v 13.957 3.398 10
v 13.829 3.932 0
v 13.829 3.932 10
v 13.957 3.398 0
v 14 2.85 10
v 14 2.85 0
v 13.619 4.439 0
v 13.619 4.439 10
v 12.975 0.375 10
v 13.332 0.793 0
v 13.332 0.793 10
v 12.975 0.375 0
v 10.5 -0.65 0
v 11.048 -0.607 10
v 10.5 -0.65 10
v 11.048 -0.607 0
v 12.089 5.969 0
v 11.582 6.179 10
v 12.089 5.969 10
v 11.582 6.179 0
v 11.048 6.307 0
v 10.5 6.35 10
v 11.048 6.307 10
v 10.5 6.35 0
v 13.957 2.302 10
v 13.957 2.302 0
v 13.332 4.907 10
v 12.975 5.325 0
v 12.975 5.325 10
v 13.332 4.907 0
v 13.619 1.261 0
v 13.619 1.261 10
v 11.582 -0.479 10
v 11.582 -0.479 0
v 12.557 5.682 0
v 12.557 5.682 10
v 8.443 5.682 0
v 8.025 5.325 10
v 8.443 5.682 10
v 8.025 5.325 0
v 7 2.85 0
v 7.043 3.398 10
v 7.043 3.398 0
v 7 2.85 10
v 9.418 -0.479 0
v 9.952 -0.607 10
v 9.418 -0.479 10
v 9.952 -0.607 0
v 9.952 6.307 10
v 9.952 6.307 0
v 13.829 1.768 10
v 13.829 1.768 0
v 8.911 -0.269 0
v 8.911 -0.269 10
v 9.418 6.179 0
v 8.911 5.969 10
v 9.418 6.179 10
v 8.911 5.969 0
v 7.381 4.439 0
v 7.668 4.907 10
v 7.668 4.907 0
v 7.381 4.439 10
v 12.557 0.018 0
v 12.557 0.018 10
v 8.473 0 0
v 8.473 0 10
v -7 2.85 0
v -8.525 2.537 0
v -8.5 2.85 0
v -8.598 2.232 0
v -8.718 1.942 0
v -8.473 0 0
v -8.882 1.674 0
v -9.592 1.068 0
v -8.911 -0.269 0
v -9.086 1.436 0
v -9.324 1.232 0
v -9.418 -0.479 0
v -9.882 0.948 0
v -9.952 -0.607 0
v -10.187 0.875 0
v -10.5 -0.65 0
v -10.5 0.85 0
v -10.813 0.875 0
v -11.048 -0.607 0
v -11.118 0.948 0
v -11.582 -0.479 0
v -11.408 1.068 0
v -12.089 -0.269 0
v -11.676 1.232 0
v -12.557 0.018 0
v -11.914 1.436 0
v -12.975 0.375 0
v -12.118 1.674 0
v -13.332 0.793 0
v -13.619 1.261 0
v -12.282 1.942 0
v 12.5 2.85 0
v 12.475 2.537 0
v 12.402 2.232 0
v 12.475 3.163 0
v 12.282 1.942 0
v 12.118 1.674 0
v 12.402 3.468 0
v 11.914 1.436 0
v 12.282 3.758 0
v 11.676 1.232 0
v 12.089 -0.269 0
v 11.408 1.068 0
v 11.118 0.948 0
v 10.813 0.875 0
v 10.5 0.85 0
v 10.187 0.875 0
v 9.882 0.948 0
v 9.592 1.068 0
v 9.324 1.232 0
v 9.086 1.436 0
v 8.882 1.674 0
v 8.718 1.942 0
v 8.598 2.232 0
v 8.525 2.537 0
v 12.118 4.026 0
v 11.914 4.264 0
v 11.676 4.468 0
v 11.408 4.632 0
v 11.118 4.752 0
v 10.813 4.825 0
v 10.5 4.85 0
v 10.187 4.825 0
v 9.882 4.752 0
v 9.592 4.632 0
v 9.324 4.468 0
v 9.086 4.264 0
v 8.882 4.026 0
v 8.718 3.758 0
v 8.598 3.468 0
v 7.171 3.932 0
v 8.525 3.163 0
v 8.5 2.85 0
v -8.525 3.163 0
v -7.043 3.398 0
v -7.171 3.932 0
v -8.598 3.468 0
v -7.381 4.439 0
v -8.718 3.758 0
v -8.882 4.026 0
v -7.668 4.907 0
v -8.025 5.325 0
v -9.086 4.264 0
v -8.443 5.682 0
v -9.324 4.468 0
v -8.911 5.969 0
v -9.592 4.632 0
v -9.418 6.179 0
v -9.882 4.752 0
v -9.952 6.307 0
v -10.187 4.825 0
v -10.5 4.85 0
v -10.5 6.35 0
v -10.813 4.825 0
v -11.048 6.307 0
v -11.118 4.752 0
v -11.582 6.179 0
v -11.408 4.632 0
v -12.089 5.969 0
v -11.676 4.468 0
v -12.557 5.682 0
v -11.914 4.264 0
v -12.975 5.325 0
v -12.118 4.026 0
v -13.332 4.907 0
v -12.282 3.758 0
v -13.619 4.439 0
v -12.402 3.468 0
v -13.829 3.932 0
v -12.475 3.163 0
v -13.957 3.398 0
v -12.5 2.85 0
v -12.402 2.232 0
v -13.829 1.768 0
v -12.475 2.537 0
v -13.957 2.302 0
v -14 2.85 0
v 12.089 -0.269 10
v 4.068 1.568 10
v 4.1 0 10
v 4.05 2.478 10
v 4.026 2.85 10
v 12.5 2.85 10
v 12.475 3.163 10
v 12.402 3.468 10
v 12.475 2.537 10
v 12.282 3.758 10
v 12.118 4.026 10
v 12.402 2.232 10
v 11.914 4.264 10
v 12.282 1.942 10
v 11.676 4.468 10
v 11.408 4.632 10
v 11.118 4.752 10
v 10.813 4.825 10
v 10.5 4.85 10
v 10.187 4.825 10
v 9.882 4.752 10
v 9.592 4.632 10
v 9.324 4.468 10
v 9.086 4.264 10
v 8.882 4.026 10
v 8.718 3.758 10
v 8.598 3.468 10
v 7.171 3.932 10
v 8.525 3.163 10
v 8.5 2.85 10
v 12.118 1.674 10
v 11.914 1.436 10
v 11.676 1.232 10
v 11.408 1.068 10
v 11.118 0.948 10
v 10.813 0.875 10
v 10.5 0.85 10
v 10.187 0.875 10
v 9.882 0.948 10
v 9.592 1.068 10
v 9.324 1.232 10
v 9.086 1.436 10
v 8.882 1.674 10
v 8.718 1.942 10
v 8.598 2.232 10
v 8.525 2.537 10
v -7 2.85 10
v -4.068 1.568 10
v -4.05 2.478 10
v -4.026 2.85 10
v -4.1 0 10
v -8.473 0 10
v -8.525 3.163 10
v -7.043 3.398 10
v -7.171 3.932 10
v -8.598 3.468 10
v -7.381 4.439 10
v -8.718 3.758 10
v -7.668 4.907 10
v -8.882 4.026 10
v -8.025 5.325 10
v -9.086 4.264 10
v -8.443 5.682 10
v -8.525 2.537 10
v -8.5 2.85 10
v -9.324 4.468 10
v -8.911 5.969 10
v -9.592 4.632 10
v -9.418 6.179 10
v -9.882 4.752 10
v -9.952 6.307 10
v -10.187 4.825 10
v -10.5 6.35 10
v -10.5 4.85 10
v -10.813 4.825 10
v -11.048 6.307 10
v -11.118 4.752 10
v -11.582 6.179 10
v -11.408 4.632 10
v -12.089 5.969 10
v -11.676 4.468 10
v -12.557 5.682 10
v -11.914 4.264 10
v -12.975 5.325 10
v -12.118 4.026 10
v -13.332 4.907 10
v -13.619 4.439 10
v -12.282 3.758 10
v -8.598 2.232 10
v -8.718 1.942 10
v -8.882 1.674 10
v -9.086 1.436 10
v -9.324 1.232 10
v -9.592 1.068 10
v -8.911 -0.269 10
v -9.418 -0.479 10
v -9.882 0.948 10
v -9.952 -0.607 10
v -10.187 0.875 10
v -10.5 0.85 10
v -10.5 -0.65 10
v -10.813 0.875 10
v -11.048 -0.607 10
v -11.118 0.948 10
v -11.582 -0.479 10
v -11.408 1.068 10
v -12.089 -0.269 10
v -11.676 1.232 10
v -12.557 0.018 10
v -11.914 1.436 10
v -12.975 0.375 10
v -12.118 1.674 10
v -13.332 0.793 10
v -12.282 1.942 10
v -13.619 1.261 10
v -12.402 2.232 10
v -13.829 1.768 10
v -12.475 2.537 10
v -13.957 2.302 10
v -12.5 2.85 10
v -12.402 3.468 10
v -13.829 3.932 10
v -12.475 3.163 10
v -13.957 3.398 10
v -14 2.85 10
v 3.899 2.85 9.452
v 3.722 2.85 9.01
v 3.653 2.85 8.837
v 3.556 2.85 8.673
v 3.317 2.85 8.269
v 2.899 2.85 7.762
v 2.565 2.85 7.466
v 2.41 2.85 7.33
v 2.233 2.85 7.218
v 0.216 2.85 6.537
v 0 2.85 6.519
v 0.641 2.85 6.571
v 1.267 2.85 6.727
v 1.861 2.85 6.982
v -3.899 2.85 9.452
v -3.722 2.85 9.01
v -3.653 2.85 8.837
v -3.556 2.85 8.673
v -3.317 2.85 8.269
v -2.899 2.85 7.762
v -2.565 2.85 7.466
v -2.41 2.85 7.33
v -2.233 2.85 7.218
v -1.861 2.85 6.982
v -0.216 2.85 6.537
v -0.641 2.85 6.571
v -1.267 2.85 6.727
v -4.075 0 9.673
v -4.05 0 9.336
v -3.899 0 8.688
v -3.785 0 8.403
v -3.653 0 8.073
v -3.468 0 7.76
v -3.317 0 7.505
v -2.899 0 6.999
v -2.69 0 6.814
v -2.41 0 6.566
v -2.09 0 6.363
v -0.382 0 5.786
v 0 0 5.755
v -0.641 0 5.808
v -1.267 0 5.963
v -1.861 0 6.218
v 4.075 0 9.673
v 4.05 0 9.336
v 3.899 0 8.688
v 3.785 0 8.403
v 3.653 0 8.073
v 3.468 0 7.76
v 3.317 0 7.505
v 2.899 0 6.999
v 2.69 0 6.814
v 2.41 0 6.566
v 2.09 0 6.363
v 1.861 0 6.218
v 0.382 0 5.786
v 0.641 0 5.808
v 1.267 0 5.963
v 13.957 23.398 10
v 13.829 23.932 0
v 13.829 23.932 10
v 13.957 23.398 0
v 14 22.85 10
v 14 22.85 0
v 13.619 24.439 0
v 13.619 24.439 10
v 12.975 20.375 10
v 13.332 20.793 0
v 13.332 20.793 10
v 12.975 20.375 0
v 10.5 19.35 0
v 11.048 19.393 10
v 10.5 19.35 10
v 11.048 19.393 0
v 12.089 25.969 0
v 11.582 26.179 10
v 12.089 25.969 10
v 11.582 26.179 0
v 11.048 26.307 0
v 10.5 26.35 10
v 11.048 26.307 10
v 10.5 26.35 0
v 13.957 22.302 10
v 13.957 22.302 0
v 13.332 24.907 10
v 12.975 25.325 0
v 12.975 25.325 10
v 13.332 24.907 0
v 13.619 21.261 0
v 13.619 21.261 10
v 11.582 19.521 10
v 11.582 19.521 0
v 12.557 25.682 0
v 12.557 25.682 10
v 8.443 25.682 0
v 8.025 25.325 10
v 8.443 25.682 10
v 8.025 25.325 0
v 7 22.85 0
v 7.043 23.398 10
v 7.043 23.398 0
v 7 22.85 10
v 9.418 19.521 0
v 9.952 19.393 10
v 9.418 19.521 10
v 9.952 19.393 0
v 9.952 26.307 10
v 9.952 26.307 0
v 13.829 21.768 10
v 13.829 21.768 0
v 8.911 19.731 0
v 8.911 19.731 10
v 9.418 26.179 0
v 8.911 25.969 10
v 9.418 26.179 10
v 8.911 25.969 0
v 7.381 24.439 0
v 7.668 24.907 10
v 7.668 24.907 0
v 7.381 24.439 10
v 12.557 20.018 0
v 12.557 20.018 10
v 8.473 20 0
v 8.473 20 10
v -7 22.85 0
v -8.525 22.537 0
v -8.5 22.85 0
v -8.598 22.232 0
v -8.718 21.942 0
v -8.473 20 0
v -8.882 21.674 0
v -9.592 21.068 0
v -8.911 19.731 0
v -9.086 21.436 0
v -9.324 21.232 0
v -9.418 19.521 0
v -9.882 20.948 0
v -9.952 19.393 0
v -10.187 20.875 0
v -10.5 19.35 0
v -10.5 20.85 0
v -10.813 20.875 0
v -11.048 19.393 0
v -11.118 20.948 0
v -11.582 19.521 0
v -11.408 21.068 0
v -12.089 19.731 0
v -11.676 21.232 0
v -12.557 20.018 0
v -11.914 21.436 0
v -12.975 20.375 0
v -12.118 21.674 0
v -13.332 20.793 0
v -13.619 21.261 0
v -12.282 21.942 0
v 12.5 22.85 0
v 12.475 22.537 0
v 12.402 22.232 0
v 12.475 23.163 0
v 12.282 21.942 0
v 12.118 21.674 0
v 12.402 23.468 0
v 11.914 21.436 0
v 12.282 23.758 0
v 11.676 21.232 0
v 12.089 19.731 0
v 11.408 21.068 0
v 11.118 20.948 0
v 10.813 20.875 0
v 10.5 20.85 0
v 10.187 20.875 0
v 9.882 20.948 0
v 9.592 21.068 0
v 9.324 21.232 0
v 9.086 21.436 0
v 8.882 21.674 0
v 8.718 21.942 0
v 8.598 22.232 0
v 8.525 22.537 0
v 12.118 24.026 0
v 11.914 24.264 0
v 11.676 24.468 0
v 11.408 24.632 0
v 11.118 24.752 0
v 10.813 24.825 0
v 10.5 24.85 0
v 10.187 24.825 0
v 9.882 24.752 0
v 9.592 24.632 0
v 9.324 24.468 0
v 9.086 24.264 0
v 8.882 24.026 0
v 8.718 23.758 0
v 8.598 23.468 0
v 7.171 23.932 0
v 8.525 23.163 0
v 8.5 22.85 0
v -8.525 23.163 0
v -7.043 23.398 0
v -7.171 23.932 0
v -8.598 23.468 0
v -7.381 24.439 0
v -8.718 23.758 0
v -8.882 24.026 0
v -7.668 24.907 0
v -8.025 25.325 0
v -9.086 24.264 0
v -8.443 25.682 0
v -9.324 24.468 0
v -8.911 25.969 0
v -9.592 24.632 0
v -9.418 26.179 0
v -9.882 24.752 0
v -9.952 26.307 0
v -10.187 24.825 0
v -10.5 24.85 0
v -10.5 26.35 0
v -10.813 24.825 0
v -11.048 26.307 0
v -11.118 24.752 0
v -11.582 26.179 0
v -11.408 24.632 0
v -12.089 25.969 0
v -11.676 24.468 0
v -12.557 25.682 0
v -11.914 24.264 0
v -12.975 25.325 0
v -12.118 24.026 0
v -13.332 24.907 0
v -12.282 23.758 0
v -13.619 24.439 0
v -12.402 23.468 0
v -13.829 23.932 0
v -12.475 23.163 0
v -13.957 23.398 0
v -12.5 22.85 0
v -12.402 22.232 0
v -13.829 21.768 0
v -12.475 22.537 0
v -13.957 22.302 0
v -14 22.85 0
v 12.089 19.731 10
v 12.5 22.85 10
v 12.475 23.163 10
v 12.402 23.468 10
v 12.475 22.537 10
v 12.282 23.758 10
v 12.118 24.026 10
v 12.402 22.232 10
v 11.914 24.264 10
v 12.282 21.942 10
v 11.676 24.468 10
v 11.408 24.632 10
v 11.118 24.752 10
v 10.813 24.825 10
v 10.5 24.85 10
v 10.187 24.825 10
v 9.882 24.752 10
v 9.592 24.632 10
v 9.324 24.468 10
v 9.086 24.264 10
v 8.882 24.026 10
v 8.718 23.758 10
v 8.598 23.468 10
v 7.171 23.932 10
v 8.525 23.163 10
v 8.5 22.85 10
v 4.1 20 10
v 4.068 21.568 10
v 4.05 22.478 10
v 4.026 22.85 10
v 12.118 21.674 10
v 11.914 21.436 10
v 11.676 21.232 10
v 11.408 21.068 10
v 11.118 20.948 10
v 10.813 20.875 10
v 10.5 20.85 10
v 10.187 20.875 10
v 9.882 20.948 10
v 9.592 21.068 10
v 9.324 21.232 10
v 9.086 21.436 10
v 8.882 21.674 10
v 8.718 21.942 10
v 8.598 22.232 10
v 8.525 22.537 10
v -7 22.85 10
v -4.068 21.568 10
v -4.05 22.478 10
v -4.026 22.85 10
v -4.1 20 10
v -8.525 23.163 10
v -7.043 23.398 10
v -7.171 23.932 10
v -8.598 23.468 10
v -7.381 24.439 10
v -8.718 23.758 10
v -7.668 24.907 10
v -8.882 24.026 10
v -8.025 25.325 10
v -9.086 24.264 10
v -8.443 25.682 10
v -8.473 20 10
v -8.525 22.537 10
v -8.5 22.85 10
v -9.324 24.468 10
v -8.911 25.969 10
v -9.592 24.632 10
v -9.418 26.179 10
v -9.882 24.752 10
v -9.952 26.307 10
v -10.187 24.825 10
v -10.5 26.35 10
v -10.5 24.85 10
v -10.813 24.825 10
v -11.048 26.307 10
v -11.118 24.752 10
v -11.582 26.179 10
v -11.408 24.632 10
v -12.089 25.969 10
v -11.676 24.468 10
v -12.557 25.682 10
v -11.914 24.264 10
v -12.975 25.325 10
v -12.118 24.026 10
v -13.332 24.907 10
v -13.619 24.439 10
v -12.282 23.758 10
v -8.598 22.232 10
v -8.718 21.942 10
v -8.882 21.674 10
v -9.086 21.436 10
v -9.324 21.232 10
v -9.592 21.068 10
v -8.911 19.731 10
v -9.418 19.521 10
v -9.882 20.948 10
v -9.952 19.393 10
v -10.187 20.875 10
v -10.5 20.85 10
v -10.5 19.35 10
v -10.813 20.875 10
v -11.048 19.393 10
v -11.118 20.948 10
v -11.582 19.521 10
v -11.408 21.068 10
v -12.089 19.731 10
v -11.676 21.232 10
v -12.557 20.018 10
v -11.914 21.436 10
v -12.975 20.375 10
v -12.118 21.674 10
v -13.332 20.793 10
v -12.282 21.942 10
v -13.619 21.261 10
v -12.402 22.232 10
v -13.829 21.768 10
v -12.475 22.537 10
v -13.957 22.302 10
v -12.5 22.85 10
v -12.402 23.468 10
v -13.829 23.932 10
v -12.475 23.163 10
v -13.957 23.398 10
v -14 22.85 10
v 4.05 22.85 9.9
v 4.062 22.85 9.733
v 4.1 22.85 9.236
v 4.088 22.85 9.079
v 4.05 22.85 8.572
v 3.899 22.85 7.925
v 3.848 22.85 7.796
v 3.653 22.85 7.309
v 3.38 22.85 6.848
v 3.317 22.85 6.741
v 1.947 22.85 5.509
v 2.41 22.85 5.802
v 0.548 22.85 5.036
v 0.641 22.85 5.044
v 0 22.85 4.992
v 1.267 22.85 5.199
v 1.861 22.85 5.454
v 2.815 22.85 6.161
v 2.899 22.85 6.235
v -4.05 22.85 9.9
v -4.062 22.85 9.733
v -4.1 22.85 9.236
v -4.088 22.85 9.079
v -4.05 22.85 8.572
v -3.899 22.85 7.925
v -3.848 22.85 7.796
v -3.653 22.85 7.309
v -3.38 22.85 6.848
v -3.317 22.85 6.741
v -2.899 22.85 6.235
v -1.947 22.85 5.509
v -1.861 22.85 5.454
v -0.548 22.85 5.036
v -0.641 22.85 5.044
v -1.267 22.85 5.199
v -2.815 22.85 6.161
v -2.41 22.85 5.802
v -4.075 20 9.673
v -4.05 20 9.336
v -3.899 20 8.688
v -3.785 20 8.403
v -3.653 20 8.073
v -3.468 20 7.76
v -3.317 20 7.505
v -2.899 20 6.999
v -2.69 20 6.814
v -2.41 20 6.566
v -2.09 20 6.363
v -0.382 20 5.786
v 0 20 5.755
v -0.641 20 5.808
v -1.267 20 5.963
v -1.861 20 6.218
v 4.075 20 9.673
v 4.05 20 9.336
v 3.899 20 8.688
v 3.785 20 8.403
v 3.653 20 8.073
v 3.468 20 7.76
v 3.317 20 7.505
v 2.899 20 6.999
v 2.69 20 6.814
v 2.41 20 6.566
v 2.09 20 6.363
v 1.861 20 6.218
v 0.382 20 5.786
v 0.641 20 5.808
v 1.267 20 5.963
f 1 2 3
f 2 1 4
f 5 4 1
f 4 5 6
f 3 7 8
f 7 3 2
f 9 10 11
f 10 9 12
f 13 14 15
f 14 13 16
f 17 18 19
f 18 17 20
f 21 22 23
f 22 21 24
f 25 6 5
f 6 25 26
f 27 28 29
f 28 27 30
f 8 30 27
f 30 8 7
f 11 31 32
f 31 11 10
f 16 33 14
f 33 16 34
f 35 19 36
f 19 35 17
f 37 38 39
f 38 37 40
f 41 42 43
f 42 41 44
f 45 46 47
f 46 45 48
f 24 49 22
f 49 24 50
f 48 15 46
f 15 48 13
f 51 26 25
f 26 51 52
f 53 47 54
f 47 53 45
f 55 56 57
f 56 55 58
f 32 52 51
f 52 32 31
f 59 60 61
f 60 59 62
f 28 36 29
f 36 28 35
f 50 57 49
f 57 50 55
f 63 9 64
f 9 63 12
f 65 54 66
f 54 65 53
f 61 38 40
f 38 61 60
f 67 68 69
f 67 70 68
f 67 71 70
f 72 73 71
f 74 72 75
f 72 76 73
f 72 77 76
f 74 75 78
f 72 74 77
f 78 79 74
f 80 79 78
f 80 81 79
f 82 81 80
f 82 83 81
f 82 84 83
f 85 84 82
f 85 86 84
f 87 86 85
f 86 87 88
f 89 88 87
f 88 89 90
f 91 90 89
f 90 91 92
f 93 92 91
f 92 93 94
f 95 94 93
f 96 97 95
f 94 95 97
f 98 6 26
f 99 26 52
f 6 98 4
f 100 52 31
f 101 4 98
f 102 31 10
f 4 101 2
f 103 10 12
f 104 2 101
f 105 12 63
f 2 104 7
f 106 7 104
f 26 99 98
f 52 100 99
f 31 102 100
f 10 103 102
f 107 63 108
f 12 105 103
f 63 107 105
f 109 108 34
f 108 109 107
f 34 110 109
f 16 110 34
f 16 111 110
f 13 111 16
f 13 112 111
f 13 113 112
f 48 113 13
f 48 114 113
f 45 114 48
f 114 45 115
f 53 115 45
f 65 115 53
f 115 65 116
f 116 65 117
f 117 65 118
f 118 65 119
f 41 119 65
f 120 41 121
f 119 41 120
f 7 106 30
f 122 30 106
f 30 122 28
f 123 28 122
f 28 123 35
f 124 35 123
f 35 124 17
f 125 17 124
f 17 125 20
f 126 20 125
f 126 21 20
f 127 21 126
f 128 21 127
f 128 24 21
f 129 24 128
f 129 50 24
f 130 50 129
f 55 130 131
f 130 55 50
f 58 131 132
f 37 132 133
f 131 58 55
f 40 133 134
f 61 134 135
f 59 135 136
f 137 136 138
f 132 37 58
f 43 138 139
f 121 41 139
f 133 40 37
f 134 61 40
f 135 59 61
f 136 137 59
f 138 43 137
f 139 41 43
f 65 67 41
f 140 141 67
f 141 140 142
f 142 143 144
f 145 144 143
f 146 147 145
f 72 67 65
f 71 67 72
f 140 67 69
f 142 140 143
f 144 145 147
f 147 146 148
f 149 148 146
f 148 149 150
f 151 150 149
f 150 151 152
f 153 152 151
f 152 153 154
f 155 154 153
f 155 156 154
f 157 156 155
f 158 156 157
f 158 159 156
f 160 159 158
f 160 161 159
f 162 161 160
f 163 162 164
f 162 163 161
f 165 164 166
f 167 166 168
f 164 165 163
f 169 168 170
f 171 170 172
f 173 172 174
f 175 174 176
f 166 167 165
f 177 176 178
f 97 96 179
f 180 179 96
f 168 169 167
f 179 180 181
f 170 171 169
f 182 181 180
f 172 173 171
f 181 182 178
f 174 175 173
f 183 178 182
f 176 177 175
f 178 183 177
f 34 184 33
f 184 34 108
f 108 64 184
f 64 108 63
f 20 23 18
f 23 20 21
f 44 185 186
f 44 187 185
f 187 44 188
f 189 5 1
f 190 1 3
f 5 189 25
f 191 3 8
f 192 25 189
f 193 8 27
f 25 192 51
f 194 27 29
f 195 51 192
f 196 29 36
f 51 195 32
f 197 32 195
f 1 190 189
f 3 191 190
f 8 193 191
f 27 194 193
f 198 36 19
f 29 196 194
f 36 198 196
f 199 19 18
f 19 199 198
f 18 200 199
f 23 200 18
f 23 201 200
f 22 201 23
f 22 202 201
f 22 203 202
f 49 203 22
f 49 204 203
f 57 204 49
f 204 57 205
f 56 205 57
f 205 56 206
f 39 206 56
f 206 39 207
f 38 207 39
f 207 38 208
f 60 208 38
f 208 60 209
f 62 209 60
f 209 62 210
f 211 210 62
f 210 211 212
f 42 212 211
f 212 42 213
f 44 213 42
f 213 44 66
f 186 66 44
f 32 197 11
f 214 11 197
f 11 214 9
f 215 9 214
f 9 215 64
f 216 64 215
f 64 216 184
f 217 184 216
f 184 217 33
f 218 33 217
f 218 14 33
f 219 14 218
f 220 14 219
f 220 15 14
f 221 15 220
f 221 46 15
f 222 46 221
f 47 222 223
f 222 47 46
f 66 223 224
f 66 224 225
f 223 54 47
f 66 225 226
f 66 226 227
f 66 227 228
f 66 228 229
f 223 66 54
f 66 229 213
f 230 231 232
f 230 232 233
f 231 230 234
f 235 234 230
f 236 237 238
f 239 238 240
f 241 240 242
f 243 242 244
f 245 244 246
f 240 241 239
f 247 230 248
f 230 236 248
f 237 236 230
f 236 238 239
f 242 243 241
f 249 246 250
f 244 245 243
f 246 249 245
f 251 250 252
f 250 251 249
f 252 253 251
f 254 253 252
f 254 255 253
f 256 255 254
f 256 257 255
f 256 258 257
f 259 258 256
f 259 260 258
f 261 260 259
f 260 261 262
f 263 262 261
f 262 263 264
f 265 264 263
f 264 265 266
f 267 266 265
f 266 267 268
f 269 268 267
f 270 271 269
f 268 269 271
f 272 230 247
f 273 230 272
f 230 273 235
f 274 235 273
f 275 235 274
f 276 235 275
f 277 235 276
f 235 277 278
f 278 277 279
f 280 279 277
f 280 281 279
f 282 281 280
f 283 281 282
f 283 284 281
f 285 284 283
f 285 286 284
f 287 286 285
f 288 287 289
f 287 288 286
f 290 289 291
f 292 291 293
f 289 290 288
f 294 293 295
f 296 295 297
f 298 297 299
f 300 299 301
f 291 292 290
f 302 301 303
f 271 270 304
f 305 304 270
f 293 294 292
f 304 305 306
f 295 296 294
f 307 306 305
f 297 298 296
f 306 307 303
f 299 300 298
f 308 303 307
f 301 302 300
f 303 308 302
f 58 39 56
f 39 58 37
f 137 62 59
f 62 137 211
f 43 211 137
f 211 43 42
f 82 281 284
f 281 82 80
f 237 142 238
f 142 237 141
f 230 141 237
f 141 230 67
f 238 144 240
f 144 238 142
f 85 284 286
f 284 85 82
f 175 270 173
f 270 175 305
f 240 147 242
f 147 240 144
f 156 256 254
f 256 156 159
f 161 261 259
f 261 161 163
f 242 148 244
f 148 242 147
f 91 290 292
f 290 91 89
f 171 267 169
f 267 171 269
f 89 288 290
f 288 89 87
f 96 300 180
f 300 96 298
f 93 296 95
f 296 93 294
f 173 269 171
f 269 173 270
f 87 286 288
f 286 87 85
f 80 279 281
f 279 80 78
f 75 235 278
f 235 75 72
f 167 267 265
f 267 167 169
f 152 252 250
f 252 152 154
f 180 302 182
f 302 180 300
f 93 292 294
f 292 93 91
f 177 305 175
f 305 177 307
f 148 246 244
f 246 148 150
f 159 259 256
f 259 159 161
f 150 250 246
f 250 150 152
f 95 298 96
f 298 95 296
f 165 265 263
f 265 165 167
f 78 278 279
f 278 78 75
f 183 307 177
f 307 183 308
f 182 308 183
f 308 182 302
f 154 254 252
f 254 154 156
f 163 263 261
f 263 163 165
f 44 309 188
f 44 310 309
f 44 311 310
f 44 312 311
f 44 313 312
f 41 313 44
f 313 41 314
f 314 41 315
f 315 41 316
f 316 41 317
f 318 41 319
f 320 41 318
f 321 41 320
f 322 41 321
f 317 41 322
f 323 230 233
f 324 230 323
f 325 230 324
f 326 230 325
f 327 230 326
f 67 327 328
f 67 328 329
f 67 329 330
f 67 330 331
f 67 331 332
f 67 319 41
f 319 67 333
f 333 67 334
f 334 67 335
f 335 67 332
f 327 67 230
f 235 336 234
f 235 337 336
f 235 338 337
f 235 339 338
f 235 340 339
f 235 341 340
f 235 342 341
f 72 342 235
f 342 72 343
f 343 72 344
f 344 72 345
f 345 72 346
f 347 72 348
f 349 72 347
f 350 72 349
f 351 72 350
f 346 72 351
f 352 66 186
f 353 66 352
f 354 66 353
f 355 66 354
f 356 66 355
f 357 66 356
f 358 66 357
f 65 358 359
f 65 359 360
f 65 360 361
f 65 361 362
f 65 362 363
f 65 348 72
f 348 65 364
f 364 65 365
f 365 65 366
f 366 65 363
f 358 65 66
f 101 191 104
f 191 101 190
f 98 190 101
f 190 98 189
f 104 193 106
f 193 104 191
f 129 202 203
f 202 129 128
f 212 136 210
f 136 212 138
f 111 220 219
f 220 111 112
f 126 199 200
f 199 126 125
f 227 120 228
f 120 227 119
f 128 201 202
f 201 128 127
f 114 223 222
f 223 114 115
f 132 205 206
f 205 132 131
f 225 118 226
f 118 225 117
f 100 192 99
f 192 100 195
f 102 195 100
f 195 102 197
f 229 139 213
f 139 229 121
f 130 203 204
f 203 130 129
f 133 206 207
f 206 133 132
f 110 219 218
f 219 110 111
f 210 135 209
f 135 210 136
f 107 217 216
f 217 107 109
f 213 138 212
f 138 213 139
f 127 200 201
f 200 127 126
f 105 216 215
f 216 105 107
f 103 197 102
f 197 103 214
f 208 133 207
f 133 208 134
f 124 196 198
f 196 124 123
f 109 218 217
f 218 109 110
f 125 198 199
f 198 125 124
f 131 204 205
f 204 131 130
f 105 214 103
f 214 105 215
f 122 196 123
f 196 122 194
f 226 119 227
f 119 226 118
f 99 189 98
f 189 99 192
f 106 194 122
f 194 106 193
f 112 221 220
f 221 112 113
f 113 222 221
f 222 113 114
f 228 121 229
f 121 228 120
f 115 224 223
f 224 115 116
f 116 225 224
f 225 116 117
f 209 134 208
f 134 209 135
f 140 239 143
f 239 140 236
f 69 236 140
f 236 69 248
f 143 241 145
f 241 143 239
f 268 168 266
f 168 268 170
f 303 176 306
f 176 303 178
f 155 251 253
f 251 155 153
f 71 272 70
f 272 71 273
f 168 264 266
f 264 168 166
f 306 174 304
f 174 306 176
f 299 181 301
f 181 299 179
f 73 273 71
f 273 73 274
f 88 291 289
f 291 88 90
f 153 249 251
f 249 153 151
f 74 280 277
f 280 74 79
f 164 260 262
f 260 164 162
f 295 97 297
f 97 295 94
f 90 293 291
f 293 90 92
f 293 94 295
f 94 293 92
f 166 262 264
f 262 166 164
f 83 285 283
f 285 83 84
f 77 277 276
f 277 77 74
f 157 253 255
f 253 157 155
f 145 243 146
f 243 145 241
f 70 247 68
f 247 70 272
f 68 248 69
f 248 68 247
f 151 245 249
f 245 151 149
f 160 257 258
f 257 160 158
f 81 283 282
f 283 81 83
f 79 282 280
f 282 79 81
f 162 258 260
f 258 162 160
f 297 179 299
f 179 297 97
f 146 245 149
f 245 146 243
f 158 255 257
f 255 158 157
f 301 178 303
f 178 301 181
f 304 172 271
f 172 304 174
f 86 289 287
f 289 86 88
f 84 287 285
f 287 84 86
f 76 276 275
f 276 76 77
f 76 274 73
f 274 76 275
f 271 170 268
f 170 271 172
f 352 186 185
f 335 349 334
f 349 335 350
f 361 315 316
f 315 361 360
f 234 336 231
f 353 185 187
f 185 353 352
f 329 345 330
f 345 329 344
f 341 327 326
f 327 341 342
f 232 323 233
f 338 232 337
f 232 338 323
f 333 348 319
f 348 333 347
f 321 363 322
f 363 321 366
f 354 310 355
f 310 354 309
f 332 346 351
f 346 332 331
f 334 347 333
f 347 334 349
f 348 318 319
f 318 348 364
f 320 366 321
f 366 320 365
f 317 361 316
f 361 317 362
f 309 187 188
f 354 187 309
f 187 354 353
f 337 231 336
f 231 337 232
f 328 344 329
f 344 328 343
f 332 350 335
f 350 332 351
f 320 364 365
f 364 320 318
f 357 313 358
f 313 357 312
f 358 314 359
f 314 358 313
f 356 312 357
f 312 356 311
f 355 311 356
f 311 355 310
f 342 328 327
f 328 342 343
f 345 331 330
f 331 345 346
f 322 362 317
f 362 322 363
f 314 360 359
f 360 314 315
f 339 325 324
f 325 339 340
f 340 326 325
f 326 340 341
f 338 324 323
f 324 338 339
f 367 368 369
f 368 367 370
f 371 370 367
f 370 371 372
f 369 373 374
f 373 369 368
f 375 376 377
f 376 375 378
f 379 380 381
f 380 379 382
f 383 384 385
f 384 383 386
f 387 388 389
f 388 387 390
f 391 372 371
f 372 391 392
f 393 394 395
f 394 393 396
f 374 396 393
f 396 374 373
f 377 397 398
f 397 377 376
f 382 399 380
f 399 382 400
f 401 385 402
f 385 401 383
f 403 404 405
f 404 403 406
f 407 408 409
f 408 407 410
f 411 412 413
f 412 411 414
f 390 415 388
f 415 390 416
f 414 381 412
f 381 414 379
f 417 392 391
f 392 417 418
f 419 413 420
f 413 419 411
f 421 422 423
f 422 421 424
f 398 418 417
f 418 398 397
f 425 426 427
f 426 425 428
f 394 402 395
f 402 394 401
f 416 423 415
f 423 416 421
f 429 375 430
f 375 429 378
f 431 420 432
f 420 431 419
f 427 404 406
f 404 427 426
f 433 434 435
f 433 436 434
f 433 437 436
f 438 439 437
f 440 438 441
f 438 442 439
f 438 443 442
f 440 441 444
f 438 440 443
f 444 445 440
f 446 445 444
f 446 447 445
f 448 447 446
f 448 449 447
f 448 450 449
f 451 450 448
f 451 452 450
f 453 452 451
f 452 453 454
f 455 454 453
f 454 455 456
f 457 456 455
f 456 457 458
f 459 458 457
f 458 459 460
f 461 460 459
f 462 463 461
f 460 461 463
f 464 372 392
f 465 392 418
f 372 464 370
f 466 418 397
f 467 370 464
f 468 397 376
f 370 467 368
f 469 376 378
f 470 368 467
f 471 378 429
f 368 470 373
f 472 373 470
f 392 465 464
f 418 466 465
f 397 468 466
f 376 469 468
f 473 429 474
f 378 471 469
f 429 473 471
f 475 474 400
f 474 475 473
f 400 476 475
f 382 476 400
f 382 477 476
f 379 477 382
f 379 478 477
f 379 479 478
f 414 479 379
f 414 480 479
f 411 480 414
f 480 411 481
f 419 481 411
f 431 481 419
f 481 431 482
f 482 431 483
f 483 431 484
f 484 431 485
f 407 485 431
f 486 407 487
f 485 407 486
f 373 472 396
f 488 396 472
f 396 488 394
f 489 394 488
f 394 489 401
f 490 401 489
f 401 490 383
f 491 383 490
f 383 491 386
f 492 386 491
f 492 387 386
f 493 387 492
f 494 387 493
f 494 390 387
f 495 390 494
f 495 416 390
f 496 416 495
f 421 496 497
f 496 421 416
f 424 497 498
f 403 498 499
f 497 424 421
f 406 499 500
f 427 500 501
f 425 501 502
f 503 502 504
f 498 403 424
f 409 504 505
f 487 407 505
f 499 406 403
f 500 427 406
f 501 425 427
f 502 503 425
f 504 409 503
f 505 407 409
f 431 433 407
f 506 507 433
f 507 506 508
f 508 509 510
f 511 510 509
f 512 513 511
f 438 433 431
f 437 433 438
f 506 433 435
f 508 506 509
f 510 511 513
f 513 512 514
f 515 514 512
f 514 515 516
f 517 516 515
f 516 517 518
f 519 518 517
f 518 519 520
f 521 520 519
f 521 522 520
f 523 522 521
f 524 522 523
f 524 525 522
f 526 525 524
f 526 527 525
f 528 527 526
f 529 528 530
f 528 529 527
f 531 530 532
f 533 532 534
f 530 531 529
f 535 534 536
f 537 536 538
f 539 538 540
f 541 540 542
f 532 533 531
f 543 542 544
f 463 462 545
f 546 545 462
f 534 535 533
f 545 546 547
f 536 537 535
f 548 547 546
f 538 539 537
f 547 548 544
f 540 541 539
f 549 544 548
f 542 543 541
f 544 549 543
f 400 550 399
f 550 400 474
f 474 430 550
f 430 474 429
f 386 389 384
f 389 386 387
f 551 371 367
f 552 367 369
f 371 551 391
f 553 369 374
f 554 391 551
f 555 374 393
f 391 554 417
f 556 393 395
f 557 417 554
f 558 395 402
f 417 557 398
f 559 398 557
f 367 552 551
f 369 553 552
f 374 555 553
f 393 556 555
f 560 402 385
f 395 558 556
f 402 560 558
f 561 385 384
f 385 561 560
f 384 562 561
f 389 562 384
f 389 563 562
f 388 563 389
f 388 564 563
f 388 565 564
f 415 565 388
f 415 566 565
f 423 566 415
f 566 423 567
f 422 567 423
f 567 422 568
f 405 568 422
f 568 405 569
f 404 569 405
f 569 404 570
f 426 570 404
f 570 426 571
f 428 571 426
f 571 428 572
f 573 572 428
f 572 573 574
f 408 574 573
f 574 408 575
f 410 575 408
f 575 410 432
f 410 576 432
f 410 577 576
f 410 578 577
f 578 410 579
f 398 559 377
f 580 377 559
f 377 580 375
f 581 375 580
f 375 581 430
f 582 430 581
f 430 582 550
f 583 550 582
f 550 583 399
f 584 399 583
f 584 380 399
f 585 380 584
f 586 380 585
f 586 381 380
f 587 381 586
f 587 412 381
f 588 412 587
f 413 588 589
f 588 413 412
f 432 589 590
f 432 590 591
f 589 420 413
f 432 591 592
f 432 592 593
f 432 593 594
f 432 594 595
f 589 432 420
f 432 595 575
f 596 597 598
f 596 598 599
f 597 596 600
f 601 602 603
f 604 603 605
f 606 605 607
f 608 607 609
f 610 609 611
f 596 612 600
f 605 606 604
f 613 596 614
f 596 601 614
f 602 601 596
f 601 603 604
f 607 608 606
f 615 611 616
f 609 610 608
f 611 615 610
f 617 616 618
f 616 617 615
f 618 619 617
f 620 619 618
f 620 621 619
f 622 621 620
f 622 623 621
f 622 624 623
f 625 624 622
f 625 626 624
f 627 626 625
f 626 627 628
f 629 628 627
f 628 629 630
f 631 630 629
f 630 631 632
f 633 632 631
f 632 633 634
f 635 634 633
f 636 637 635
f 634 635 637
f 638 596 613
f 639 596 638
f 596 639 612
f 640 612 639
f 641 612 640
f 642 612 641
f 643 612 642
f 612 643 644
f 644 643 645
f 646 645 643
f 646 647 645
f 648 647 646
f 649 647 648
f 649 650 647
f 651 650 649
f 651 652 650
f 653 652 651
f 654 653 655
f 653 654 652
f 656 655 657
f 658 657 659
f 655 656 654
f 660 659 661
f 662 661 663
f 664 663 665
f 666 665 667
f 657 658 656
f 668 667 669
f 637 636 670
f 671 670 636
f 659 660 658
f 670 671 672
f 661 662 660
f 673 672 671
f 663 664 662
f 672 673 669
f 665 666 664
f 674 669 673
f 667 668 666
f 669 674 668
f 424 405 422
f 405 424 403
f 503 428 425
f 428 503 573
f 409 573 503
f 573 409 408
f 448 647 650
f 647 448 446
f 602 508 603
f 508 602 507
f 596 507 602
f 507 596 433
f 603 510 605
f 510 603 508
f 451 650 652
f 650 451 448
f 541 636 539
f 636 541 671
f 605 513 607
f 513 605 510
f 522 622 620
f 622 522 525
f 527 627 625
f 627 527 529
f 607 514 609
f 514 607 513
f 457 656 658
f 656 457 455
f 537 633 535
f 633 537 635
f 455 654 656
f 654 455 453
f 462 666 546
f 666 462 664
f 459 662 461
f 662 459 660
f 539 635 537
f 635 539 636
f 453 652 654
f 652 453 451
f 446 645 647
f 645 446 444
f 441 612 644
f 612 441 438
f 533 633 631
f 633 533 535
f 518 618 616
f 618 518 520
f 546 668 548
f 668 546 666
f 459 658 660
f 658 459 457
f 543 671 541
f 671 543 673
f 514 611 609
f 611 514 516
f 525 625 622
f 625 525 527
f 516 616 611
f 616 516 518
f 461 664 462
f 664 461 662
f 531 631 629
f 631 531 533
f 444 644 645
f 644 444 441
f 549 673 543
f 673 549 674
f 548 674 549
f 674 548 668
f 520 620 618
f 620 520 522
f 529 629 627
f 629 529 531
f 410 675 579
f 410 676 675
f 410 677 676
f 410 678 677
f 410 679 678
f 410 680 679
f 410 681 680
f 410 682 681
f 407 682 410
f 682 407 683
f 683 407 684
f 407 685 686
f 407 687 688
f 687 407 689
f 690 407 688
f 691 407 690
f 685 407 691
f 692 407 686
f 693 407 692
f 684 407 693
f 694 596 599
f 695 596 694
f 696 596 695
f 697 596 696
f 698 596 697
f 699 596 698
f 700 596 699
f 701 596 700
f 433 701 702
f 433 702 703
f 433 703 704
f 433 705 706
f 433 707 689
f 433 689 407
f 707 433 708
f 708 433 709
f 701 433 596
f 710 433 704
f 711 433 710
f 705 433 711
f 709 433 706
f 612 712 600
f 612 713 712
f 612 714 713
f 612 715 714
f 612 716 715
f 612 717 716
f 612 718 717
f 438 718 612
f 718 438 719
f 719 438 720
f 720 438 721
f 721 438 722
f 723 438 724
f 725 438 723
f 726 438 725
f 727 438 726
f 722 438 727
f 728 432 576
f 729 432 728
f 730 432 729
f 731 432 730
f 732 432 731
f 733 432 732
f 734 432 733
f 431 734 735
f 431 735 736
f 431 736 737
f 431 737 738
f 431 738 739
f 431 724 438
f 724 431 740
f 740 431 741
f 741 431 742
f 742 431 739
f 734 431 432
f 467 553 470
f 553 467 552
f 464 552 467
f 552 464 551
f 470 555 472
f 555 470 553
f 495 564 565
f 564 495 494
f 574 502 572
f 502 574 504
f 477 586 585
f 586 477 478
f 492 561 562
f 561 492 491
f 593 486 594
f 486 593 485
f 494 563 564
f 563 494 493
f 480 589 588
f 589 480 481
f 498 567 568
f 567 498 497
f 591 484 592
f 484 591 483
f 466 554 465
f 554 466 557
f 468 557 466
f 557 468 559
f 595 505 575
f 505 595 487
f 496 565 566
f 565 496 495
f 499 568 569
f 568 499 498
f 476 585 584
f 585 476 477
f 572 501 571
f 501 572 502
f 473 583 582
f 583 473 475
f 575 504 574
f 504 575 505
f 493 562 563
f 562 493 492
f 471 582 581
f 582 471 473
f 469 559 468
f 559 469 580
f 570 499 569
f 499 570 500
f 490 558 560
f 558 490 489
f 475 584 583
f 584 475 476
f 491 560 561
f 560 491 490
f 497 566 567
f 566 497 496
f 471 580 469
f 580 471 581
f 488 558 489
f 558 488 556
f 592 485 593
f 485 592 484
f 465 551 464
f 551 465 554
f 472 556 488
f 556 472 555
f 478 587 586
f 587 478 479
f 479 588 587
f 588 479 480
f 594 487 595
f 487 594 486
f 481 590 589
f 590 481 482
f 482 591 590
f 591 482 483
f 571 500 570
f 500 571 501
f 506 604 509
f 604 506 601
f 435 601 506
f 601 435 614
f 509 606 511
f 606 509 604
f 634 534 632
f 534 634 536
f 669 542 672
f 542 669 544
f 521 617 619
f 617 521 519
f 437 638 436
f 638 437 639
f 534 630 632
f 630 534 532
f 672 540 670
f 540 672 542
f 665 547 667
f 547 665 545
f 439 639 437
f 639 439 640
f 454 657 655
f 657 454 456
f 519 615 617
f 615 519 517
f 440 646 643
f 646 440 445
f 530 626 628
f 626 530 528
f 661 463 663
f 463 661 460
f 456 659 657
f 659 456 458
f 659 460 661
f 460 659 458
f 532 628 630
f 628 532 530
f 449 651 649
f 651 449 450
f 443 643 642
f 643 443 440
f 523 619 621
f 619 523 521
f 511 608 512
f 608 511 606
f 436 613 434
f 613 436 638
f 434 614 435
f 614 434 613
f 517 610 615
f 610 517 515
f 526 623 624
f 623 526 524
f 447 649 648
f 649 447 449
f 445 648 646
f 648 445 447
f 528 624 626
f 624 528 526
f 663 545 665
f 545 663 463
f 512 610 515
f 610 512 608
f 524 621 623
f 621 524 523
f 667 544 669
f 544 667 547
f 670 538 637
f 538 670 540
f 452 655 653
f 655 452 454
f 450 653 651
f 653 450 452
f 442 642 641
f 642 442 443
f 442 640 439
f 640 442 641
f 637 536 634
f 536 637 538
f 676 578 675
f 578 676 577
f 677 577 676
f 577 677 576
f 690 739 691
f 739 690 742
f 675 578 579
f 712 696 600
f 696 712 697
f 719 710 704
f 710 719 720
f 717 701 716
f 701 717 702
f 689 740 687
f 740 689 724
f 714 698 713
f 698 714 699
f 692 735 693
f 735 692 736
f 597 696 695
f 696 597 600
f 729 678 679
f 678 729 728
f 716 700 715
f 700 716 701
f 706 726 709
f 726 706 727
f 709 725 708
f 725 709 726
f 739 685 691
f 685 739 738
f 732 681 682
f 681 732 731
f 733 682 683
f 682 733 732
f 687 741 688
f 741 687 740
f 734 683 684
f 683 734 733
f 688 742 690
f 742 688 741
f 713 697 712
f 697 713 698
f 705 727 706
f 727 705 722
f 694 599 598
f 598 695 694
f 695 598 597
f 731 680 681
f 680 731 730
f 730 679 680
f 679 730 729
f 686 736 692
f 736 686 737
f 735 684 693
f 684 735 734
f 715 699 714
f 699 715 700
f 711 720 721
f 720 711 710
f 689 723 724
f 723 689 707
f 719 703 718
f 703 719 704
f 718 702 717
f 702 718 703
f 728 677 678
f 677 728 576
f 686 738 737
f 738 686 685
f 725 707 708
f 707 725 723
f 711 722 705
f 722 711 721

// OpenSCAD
//outside diameter of column, which will fit over vertical frame support rod
column_dia = 7;
//inside diameter of column - make a but undersize, and drill out to precise desired diameter (I use a #29 drill bit for the Mini Owl)
column_hole_dia = 4;
//overall height of the completed mount - should be the same height as the vertical support rods
column_ht = 20;
//center-to-center distance between the columns (I use 21mm for the Mini Owl)
column_spacing = 21;

//diameter of the hole in the mount for the camera lens - will clamp around narrow neck of camera lens
lens_dia = 8.2;
//distance in mm, forward (positive) or backward (negative), to offset mounting plate for camera (at zero, front edge of plate will be centered between the vertical support rods)
lens_offset = 0;
//thickness of the mounting plate for the camera lens
mount_thickness = 2.85; 

//angle from horizontal that camera should point (positive points upward, negative points downward)
camera_angle = 15;

//distance between printed top and bottom halves of mount
print_offset = 20;

module mount(offset, angle) {
    $fn=40;
    translate([0, offset, 0]) {
        difference() {
            union() {
                columns();
                mount_wall();
            }
            
            column_holes();
            lens_hole(angle);
        }
    }
}

module columns() {
    translate([column_spacing/2, mount_thickness, 0])
        cylinder(d=column_dia, h=column_ht/2);

    translate([-column_spacing/2, mount_thickness, 0])
        cylinder(d=column_dia, h=column_ht/2);
}

module column_holes() {
    translate([column_spacing/2, mount_thickness, 0])
        cylinder(d=column_hole_dia, h=column_ht/2);

    translate([-column_spacing/2, mount_thickness, 0])
        cylinder(d=column_hole_dia, h=column_ht/2);
}

module mount_wall() {
    translate([-column_spacing/2, lens_offset, 0])
        cube([column_spacing, mount_thickness, column_ht/2]);
}

module lens_hole(angle) {
    translate([0, 0, column_ht/2])
        rotate([90 + angle, 0, 0])
            cylinder(d=lens_dia, h=mount_thickness*4, center=true);
}

mount(0, camera_angle);
mount(print_offset, -camera_angle);
